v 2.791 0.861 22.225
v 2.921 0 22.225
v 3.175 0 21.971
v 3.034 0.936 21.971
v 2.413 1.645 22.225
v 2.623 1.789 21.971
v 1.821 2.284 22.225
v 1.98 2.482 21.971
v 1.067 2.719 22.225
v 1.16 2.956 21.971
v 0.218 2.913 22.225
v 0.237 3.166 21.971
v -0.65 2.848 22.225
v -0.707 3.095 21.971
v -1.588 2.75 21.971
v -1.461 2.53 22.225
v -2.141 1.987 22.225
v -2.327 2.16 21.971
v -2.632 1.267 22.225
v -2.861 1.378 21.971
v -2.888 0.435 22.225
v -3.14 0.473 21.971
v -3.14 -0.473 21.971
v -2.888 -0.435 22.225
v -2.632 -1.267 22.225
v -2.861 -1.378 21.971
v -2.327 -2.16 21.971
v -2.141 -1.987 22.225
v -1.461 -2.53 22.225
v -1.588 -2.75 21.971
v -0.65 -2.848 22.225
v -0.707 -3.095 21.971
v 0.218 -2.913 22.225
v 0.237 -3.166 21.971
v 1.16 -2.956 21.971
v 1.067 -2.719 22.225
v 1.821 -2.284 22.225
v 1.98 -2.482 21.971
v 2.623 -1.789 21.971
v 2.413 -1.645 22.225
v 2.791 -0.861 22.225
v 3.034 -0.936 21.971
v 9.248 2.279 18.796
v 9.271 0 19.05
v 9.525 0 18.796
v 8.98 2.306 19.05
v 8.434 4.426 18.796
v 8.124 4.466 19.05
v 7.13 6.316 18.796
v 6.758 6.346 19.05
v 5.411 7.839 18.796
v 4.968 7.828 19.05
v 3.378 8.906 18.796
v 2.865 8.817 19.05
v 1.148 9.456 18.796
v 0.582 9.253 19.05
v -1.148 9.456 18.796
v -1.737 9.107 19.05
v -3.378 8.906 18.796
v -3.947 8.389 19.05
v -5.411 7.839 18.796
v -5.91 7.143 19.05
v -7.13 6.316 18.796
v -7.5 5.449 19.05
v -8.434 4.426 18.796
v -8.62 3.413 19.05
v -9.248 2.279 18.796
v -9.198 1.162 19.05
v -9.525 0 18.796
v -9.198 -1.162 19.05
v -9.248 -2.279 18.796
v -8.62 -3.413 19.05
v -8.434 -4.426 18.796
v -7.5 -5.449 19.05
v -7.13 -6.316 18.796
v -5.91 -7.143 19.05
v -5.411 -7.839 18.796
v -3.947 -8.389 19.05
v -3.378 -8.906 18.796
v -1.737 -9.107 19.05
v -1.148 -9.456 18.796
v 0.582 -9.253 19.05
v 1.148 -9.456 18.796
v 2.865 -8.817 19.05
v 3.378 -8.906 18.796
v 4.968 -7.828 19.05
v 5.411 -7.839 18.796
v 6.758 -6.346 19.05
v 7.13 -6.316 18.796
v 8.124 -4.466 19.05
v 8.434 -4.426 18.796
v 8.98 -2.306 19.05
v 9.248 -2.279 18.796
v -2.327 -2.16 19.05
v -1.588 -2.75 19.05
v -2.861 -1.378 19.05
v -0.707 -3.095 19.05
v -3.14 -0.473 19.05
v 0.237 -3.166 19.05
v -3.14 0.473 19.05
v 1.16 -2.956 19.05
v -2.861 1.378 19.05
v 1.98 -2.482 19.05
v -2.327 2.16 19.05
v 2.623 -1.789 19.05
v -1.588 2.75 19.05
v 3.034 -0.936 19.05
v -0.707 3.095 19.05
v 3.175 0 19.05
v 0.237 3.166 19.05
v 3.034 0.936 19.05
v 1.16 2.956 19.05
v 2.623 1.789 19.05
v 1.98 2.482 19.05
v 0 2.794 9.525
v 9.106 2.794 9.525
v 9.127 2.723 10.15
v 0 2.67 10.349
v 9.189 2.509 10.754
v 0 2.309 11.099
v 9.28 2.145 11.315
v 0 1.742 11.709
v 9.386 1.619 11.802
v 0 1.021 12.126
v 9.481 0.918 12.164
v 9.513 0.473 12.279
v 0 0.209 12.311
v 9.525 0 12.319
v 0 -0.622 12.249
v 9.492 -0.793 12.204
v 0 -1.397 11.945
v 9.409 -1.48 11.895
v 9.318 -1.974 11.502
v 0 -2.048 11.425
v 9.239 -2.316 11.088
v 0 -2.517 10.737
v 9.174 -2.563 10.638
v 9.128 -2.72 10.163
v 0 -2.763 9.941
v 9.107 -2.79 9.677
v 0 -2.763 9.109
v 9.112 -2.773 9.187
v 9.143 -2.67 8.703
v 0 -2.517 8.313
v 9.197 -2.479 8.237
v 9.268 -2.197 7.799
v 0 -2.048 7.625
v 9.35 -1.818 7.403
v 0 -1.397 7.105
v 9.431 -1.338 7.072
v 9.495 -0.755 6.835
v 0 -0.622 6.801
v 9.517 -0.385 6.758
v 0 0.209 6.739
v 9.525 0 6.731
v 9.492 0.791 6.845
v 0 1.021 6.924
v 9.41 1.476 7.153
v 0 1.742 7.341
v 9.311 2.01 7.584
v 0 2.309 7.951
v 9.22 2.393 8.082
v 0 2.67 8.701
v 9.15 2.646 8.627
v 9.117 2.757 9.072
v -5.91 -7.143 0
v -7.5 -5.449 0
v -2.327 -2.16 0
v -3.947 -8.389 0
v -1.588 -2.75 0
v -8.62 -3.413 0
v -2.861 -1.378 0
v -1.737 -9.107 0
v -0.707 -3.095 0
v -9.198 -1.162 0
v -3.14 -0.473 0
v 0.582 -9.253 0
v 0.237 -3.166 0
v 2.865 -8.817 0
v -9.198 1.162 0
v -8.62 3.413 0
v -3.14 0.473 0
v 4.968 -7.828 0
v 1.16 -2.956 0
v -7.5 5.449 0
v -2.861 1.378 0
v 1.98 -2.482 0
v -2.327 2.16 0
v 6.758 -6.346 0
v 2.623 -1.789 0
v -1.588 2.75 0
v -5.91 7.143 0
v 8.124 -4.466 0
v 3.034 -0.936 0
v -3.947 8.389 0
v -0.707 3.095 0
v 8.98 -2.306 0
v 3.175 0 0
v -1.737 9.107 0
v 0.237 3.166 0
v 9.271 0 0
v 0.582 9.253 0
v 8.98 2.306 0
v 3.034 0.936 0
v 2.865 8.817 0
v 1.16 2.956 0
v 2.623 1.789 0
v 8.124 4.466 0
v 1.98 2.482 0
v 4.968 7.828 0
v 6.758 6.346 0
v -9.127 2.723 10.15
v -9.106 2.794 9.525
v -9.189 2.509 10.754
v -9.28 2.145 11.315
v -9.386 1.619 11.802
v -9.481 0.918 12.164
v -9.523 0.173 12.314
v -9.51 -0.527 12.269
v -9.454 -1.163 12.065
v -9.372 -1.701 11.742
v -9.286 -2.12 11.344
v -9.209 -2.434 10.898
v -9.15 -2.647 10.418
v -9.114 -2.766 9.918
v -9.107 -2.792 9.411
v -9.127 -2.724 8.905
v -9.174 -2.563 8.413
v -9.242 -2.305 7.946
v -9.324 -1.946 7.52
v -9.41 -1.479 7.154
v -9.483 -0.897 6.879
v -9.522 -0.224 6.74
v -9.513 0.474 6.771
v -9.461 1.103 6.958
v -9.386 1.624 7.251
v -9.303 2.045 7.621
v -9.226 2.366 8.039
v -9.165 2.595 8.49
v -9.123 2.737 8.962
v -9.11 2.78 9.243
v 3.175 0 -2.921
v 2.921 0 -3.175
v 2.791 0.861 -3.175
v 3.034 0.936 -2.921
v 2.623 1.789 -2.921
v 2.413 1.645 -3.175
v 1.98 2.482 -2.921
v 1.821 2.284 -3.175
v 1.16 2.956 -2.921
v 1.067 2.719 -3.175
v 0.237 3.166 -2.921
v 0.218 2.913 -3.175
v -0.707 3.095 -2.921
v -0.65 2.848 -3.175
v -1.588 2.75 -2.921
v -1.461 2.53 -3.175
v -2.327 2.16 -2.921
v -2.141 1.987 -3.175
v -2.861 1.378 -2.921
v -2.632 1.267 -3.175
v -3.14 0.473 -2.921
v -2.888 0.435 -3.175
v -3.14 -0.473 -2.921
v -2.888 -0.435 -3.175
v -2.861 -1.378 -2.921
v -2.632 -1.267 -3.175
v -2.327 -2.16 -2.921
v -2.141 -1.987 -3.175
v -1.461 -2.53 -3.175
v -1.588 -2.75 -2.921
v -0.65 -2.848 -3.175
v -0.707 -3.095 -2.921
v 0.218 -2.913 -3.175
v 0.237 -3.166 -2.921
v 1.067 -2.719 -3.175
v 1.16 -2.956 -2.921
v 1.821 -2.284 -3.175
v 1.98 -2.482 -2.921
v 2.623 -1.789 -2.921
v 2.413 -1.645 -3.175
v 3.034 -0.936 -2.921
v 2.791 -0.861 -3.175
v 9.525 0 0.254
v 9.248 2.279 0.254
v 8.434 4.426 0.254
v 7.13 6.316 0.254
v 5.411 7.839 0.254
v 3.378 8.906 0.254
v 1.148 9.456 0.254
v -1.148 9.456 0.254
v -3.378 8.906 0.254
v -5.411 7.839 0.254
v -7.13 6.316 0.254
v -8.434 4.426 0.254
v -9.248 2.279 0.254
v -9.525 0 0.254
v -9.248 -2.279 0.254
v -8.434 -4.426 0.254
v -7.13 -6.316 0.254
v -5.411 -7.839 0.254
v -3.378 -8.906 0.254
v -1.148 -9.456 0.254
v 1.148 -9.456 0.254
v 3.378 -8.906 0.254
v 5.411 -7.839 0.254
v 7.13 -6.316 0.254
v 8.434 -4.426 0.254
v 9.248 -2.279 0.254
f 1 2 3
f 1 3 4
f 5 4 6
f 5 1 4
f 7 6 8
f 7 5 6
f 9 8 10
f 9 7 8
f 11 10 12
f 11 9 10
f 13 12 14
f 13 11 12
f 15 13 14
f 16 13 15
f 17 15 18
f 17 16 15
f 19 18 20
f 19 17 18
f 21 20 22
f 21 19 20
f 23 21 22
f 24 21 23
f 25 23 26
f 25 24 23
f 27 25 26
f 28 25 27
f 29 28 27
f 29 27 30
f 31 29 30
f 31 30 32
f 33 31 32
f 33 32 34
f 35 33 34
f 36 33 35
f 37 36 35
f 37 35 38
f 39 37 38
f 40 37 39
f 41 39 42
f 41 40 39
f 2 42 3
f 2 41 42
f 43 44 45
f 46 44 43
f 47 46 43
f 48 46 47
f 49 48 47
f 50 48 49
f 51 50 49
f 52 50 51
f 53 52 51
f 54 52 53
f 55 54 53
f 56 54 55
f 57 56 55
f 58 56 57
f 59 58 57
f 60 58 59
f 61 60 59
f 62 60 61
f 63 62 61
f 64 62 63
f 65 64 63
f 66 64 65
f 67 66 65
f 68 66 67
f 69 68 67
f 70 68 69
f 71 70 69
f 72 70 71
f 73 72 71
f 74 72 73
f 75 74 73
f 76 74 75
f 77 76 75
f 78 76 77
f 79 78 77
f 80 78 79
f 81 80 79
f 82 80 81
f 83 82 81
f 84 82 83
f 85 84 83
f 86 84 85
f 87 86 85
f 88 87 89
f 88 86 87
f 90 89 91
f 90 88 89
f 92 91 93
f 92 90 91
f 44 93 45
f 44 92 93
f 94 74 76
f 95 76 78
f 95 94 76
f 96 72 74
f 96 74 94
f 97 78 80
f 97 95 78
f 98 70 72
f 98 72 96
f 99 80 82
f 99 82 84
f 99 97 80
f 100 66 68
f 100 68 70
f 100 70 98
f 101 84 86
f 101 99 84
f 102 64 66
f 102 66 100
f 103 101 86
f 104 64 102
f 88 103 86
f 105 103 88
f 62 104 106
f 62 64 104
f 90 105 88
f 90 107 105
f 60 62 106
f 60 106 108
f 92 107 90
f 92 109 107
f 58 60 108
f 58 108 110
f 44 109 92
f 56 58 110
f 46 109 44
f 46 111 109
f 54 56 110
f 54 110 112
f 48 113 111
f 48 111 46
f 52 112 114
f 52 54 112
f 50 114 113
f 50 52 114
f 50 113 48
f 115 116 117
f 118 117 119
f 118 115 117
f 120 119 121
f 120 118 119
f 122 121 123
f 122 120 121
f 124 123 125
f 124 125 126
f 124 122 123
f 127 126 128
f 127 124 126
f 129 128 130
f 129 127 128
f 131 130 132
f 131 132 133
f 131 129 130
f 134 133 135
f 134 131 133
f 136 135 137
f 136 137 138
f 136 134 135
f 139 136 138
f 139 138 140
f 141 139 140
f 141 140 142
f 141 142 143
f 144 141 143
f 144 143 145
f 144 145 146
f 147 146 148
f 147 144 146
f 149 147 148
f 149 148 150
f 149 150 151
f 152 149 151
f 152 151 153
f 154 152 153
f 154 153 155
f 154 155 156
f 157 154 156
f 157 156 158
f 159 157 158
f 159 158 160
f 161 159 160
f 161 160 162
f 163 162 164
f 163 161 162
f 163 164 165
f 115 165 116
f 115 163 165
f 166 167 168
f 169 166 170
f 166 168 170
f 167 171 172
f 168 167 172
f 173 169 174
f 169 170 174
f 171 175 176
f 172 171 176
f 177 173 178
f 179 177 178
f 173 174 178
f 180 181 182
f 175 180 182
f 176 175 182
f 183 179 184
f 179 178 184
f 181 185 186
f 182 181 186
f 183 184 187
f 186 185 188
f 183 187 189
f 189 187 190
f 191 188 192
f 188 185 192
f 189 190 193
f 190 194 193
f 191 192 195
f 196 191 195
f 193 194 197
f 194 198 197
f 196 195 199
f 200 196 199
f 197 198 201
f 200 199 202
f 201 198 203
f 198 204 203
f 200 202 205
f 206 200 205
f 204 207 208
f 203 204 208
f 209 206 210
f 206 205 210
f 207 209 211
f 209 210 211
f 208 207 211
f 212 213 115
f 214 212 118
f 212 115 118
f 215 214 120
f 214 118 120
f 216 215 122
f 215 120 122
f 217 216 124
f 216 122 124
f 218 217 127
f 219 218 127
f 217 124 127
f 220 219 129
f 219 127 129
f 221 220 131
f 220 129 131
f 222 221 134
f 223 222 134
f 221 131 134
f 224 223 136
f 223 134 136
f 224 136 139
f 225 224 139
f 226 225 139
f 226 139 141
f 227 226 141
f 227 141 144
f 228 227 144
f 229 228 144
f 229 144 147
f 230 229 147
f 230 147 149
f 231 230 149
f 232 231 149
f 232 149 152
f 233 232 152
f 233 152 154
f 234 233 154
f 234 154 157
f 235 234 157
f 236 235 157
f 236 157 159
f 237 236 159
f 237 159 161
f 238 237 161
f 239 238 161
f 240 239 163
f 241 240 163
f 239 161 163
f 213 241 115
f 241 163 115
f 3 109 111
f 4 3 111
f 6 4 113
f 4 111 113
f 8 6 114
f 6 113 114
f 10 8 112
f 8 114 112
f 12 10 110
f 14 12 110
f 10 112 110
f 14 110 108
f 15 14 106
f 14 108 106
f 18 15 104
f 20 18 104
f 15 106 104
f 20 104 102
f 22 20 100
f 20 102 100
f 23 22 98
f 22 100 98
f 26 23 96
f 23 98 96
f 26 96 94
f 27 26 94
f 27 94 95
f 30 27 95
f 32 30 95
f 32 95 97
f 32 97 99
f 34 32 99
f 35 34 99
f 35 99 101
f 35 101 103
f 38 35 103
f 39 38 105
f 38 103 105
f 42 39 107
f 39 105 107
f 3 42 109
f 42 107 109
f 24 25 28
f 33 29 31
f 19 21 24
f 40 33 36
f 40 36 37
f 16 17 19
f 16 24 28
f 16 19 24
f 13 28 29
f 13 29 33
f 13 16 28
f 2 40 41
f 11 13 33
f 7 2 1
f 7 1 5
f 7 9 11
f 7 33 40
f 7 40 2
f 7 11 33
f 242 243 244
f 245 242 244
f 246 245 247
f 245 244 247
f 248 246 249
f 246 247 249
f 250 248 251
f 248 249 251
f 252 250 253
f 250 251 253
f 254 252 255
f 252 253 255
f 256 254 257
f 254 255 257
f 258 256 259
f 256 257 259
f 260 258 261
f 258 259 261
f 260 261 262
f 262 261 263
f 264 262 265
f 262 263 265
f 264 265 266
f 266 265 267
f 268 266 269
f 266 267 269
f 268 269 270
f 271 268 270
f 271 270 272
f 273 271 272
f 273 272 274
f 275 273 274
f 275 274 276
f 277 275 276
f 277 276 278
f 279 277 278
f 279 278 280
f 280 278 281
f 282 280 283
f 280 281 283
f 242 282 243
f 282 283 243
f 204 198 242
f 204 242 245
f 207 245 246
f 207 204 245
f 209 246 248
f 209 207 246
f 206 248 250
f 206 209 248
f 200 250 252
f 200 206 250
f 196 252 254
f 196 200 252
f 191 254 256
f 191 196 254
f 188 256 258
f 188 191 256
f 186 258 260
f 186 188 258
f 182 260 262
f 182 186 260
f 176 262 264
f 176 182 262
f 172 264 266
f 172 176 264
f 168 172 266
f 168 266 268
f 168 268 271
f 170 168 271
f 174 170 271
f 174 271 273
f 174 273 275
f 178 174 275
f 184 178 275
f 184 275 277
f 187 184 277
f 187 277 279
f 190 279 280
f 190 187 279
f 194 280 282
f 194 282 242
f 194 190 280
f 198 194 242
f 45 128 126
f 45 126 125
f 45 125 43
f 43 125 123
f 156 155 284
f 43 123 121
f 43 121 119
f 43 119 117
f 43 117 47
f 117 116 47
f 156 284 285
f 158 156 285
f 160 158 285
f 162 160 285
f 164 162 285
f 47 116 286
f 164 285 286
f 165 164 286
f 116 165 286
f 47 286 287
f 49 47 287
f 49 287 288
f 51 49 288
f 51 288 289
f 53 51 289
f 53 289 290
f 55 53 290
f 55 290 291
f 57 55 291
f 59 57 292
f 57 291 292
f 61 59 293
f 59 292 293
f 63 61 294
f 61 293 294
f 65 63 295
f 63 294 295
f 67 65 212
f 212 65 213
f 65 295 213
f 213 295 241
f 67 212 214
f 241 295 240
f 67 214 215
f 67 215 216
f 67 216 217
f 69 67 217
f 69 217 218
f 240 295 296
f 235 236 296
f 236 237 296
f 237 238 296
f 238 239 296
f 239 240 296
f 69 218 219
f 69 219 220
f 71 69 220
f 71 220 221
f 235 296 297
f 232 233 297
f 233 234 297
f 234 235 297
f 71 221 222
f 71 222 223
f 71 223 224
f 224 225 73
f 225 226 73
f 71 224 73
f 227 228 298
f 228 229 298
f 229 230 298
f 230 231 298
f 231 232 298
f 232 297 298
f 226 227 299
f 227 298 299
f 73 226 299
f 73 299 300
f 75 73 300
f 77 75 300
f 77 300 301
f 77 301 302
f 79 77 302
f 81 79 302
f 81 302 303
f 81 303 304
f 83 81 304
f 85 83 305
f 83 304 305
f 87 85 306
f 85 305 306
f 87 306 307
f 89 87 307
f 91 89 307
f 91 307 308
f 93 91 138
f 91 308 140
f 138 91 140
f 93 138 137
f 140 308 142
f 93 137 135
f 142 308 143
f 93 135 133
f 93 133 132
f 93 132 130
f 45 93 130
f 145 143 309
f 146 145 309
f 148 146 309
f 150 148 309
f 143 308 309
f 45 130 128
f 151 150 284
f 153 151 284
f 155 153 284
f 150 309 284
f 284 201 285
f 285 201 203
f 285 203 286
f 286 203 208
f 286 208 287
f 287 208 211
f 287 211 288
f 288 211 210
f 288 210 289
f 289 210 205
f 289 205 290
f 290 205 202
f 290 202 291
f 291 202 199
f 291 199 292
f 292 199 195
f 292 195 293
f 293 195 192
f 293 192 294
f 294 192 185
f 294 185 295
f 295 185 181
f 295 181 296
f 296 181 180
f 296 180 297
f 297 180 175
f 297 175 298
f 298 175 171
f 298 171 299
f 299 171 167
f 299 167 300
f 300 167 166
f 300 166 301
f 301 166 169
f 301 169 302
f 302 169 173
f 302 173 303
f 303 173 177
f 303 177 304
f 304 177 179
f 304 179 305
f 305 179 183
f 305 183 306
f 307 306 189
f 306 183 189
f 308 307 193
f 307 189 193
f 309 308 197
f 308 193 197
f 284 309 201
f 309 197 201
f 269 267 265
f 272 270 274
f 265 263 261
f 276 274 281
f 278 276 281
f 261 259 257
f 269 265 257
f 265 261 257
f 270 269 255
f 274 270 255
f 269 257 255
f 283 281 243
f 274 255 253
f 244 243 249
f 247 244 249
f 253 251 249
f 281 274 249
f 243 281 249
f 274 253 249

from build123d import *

# Parameters (mm, degrees)
F0_R     = 9.525
F1_DEPTH = 19.05
F2_R     = 3.175
F3_DEPTH = 3.175
F4_R     = 3.175
F5_DEPTH = 3.175
F6_SIZE  = 0.254
F7_R     = 2.794
F8_DEPTH = 25.4
F9_DEPTH = 25.4


with BuildPart() as f1:
    # F0 (on Top) → F1 (new body)
    with BuildSketch(Plane.XY):
        Circle(F0_R)
    extrude(amount=F1_DEPTH)

    # F2 (on Top) → F3 (join)
    with BuildSketch(Plane.XY):
        Circle(F2_R)
    extrude(amount=-F3_DEPTH)

    # F4 (on face) → F5 (join)
    with BuildSketch(Plane.XY.offset(19.05)):
        Circle(F4_R)
    extrude(amount=F5_DEPTH)

    # F6
    f6_edges = [f1.edges().sort_by_distance(p)[0] for p in [
        (-3.175, 0, 22.225),
        (-9.525, 0, 19.05),
        (-3.175, 0, -3.175),
        (-9.525, 0, 0),
    ]]
    chamfer(f6_edges, length=F6_SIZE)

    # F7 (on Right) → F8 (cut)
    with BuildSketch(Plane.YZ):
        with Locations((0, 9.525)):
            Circle(F7_R)
    extrude(amount=-F8_DEPTH, mode=Mode.SUBTRACT)

    # F7 (on Right) → F9 (cut)
    with BuildSketch(Plane.YZ):
        with Locations((0, 9.525)):
            Circle(F7_R)
    extrude(amount=F9_DEPTH, mode=Mode.SUBTRACT)


solid = f1.part
